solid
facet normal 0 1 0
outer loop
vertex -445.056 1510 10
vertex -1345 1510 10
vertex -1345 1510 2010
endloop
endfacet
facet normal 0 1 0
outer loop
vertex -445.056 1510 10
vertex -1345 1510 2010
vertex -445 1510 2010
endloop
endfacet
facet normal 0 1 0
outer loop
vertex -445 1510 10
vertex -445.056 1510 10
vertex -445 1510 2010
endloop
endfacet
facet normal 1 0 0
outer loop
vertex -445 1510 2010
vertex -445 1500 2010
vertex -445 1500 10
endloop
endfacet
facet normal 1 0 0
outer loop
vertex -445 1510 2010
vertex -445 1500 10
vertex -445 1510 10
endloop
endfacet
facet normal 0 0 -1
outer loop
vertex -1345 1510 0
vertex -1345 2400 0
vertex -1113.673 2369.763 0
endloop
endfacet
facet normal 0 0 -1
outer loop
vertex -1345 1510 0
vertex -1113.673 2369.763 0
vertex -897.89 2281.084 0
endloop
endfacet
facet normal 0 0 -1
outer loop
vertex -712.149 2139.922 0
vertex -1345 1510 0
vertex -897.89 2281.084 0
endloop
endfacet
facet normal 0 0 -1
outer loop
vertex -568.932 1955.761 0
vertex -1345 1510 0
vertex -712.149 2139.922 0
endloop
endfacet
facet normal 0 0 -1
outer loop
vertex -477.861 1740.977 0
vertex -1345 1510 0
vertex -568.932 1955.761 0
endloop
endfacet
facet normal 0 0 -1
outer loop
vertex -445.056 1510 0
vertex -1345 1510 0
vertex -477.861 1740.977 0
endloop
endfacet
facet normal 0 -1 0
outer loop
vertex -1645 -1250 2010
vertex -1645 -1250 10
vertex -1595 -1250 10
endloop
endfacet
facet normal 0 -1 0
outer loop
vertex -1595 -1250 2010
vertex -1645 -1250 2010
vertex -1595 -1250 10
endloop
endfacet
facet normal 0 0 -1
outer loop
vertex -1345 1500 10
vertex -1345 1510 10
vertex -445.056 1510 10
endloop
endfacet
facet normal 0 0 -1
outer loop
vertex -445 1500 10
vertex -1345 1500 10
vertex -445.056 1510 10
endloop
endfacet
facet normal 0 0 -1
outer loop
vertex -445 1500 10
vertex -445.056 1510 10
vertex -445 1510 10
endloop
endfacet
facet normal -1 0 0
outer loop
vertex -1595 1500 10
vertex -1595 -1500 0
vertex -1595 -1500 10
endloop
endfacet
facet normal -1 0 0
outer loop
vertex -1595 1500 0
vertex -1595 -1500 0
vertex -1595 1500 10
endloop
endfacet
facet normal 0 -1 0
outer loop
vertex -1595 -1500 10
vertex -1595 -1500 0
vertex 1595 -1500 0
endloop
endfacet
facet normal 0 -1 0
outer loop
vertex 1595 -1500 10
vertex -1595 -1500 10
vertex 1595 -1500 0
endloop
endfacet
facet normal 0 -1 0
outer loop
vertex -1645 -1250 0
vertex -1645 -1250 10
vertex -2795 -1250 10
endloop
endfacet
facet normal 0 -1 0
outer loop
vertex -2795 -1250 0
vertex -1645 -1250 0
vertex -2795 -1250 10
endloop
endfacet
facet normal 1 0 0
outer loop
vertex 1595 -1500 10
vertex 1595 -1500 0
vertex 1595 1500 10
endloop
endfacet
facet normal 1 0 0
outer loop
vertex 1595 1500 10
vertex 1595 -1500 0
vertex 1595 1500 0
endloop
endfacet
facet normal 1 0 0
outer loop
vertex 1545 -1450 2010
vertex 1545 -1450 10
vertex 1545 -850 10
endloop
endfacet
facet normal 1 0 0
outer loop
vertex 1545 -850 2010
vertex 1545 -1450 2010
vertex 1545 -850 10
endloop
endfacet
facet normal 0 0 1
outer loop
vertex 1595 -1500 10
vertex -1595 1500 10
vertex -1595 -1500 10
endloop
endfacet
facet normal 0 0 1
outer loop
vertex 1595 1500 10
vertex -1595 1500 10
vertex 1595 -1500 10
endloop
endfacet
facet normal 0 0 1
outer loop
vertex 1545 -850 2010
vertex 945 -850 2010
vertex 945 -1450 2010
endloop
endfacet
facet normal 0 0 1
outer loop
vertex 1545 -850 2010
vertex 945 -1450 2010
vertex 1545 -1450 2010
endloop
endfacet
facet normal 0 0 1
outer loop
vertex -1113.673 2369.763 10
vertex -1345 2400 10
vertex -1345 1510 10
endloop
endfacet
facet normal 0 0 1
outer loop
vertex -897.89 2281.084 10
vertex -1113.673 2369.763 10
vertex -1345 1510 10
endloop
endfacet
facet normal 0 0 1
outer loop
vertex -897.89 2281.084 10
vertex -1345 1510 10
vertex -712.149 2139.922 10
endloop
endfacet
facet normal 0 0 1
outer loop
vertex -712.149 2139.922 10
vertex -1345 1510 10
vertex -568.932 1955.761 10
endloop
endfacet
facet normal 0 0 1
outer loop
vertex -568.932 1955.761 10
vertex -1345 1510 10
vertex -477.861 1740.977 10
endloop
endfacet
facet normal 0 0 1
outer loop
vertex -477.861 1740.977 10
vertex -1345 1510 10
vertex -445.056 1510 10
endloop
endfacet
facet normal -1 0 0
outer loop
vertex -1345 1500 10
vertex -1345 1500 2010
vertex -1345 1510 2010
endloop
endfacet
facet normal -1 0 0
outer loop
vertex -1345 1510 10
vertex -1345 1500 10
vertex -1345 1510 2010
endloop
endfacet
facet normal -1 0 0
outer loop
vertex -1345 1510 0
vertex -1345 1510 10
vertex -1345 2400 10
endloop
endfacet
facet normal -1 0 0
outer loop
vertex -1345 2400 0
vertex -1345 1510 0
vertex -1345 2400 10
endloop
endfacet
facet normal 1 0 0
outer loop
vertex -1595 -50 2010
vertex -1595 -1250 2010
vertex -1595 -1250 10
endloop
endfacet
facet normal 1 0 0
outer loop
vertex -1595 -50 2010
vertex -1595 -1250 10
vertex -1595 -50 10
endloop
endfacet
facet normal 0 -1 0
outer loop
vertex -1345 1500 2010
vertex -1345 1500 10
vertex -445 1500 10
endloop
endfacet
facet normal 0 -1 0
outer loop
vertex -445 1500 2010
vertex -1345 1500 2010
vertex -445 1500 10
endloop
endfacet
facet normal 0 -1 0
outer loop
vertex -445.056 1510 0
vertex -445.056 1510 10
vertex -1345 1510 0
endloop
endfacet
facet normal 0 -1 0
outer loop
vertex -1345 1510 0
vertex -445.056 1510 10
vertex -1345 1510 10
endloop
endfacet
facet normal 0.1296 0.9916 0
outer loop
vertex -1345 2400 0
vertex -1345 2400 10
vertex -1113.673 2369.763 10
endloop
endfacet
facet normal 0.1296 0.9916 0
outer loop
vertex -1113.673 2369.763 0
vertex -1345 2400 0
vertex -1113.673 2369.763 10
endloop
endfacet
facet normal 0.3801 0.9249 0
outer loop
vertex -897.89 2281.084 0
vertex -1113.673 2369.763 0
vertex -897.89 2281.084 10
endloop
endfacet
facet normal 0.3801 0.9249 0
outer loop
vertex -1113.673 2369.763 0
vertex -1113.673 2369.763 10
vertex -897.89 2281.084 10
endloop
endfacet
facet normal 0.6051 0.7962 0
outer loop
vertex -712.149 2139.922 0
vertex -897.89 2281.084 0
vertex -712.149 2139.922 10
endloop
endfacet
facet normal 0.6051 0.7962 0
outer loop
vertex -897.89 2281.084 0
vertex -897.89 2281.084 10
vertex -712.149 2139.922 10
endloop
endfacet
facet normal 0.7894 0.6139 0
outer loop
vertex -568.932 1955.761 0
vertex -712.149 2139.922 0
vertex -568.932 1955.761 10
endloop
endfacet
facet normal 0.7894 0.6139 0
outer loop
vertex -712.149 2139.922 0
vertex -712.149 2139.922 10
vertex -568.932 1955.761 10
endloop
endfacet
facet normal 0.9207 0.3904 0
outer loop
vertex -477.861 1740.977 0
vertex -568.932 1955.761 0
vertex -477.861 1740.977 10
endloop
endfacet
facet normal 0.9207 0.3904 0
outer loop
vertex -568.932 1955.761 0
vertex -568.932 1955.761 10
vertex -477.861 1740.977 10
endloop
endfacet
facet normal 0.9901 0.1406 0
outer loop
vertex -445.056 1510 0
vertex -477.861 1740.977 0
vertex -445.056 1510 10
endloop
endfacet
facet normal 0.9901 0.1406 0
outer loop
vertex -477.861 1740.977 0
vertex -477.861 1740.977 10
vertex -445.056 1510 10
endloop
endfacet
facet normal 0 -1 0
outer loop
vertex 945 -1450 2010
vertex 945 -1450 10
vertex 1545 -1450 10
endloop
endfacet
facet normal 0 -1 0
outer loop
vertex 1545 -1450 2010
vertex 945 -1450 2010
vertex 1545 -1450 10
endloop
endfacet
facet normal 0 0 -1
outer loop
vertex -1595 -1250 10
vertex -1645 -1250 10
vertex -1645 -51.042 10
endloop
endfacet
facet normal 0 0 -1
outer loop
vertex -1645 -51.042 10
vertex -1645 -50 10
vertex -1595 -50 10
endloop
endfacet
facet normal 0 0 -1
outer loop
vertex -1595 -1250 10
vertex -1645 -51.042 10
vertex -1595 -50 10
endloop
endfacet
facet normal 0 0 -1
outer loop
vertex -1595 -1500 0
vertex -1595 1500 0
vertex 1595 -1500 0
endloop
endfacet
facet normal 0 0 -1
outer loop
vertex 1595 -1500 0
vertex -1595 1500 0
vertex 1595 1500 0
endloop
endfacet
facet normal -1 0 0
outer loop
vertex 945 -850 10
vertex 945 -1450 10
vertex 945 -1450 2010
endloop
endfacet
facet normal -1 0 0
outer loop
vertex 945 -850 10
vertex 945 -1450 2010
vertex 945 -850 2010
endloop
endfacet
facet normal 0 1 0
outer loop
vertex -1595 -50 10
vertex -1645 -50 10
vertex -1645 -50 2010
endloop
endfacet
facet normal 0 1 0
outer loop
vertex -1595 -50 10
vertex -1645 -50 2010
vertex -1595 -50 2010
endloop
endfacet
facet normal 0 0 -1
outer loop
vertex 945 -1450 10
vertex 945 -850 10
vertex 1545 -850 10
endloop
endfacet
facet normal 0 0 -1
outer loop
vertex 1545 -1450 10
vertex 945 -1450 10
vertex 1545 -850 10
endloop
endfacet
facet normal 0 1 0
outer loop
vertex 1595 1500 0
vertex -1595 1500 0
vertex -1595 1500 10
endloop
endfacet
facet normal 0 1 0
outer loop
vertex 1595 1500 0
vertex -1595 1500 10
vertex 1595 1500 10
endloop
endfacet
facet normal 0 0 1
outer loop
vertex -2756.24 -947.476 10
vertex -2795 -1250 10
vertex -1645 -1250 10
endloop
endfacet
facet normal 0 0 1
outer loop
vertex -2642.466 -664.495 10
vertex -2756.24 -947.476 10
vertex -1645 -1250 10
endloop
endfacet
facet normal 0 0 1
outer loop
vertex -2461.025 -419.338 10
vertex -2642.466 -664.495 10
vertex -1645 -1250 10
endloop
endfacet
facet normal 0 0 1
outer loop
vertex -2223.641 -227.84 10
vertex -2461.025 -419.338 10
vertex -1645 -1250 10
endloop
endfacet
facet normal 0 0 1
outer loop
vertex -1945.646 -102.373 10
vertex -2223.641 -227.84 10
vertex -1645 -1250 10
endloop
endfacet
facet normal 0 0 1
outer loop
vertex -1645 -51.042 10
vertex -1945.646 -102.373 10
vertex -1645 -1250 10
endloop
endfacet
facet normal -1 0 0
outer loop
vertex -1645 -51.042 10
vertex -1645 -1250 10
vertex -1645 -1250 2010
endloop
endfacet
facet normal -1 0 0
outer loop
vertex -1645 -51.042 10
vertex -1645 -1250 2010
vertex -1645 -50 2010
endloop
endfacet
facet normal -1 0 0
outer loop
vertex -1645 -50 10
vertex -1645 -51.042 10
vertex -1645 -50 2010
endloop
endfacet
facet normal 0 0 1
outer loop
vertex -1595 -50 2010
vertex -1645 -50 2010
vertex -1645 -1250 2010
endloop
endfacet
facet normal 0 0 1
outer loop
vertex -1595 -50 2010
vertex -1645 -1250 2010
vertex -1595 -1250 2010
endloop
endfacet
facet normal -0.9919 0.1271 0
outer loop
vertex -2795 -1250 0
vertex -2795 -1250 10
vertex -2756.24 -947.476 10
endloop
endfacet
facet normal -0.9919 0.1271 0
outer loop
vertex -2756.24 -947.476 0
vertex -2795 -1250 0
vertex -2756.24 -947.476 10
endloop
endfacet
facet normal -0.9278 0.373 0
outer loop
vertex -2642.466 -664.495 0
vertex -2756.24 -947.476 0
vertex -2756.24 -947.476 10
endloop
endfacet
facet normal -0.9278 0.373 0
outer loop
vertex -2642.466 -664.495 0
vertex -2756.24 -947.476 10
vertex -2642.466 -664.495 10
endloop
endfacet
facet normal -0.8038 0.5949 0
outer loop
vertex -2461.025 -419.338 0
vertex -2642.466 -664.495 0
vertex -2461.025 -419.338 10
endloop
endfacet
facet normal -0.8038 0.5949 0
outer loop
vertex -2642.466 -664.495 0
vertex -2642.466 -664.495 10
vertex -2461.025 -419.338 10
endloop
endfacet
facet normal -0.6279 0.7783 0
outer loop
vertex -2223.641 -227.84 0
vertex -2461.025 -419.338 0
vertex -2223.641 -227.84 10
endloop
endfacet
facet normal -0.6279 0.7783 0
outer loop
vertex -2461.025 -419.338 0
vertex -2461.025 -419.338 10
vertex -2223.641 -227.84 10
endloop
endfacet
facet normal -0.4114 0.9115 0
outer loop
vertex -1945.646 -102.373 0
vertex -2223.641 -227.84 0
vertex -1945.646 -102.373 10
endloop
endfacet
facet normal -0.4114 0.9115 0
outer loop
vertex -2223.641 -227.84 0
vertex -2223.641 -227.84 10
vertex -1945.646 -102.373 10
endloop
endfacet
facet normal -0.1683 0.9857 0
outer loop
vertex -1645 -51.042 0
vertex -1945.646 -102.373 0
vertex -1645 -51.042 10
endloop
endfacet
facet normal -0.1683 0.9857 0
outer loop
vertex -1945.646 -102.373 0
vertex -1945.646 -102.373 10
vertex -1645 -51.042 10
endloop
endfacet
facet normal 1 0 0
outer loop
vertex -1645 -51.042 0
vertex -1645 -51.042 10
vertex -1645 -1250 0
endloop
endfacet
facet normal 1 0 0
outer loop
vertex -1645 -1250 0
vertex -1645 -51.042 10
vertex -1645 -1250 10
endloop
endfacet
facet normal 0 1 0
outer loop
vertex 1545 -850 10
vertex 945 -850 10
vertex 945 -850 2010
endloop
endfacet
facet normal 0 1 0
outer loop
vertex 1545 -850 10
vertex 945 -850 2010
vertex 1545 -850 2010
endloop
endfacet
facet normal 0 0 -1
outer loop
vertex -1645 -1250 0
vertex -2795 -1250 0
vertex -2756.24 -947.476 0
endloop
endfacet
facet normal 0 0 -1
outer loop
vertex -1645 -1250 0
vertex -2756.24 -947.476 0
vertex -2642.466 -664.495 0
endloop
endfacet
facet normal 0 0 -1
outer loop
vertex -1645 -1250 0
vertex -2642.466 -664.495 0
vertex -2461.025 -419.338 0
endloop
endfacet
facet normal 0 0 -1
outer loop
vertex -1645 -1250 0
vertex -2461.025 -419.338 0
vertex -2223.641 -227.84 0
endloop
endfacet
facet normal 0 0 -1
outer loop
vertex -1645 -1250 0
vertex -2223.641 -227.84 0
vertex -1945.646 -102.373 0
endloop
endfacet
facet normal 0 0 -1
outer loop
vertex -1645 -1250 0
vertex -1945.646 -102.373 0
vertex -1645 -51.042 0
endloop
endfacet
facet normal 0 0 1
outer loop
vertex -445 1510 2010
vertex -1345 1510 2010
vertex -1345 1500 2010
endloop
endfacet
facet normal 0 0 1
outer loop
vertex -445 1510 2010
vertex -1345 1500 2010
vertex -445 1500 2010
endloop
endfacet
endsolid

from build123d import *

# Parameters (mm, degrees)
F0_W     = 3190
F0_H     = 3000
F1_DEPTH = 10
F2_W     = 900
F2_H     = 10
F2_W_2   = 50
F2_H_2   = 1200
F3_DEPTH = 2000
F4_W     = 600
F4_H     = 600
F5_DEPTH = 2000
F8_DEPTH = 10
F9_DEPTH = 10


with BuildPart() as f1:
    # F0 (on Top) → F1 (new body)
    with BuildSketch(Plane.XY):
        Rectangle(F0_W, F0_H)
    extrude(amount=F1_DEPTH)


with BuildPart() as f3:
    # F2 (on face) → F3 (new body)
    with BuildSketch(Plane.XY.offset(10)):
        with Locations((-895, 1505)):
            Rectangle(F2_W, F2_H)
        with Locations((-1620, -650)):
            Rectangle(F2_W_2, F2_H_2)
    extrude(amount=F3_DEPTH)

    # F7 (on face) → F8 (join)
    with BuildSketch(Plane(origin=(0, 0, 10), x_dir=(1, 0, 0), z_dir=(0, 0, -1))):
        with BuildLine():
            Line((-1345, -1510), (-1345, -2400))
            ThreePointArc((-1345, -2400), (-712.149307, -2139.92187), (-445.055557, -1510))
            Line((-445.055557, -1510), (-1345, -1510))
        make_face()
    extrude(amount=F8_DEPTH)

    # F6 (on face) → F9 (join)
    with BuildSketch(Plane(origin=(0, 0, 10), x_dir=(1, 0, 0), z_dir=(0, 0, -1))):
        with BuildLine():
            Line((-1645, 1250), (-2795, 1250))
            ThreePointArc((-2795, 1250), (-2461.025404, 419.337614), (-1645, 51.042119))
            Line((-1645, 51.042119), (-1645, 1250))
        make_face()
    extrude(amount=F9_DEPTH)


with BuildPart() as f5:
    # F4 (on face) → F5 (new body)
    with BuildSketch(Plane.XY.offset(10)):
        with Locations((1245, -1150)):
            Rectangle(F4_W, F4_H)
    extrude(amount=F5_DEPTH)


solid = Compound([f1.part, f3.part, f5.part])
